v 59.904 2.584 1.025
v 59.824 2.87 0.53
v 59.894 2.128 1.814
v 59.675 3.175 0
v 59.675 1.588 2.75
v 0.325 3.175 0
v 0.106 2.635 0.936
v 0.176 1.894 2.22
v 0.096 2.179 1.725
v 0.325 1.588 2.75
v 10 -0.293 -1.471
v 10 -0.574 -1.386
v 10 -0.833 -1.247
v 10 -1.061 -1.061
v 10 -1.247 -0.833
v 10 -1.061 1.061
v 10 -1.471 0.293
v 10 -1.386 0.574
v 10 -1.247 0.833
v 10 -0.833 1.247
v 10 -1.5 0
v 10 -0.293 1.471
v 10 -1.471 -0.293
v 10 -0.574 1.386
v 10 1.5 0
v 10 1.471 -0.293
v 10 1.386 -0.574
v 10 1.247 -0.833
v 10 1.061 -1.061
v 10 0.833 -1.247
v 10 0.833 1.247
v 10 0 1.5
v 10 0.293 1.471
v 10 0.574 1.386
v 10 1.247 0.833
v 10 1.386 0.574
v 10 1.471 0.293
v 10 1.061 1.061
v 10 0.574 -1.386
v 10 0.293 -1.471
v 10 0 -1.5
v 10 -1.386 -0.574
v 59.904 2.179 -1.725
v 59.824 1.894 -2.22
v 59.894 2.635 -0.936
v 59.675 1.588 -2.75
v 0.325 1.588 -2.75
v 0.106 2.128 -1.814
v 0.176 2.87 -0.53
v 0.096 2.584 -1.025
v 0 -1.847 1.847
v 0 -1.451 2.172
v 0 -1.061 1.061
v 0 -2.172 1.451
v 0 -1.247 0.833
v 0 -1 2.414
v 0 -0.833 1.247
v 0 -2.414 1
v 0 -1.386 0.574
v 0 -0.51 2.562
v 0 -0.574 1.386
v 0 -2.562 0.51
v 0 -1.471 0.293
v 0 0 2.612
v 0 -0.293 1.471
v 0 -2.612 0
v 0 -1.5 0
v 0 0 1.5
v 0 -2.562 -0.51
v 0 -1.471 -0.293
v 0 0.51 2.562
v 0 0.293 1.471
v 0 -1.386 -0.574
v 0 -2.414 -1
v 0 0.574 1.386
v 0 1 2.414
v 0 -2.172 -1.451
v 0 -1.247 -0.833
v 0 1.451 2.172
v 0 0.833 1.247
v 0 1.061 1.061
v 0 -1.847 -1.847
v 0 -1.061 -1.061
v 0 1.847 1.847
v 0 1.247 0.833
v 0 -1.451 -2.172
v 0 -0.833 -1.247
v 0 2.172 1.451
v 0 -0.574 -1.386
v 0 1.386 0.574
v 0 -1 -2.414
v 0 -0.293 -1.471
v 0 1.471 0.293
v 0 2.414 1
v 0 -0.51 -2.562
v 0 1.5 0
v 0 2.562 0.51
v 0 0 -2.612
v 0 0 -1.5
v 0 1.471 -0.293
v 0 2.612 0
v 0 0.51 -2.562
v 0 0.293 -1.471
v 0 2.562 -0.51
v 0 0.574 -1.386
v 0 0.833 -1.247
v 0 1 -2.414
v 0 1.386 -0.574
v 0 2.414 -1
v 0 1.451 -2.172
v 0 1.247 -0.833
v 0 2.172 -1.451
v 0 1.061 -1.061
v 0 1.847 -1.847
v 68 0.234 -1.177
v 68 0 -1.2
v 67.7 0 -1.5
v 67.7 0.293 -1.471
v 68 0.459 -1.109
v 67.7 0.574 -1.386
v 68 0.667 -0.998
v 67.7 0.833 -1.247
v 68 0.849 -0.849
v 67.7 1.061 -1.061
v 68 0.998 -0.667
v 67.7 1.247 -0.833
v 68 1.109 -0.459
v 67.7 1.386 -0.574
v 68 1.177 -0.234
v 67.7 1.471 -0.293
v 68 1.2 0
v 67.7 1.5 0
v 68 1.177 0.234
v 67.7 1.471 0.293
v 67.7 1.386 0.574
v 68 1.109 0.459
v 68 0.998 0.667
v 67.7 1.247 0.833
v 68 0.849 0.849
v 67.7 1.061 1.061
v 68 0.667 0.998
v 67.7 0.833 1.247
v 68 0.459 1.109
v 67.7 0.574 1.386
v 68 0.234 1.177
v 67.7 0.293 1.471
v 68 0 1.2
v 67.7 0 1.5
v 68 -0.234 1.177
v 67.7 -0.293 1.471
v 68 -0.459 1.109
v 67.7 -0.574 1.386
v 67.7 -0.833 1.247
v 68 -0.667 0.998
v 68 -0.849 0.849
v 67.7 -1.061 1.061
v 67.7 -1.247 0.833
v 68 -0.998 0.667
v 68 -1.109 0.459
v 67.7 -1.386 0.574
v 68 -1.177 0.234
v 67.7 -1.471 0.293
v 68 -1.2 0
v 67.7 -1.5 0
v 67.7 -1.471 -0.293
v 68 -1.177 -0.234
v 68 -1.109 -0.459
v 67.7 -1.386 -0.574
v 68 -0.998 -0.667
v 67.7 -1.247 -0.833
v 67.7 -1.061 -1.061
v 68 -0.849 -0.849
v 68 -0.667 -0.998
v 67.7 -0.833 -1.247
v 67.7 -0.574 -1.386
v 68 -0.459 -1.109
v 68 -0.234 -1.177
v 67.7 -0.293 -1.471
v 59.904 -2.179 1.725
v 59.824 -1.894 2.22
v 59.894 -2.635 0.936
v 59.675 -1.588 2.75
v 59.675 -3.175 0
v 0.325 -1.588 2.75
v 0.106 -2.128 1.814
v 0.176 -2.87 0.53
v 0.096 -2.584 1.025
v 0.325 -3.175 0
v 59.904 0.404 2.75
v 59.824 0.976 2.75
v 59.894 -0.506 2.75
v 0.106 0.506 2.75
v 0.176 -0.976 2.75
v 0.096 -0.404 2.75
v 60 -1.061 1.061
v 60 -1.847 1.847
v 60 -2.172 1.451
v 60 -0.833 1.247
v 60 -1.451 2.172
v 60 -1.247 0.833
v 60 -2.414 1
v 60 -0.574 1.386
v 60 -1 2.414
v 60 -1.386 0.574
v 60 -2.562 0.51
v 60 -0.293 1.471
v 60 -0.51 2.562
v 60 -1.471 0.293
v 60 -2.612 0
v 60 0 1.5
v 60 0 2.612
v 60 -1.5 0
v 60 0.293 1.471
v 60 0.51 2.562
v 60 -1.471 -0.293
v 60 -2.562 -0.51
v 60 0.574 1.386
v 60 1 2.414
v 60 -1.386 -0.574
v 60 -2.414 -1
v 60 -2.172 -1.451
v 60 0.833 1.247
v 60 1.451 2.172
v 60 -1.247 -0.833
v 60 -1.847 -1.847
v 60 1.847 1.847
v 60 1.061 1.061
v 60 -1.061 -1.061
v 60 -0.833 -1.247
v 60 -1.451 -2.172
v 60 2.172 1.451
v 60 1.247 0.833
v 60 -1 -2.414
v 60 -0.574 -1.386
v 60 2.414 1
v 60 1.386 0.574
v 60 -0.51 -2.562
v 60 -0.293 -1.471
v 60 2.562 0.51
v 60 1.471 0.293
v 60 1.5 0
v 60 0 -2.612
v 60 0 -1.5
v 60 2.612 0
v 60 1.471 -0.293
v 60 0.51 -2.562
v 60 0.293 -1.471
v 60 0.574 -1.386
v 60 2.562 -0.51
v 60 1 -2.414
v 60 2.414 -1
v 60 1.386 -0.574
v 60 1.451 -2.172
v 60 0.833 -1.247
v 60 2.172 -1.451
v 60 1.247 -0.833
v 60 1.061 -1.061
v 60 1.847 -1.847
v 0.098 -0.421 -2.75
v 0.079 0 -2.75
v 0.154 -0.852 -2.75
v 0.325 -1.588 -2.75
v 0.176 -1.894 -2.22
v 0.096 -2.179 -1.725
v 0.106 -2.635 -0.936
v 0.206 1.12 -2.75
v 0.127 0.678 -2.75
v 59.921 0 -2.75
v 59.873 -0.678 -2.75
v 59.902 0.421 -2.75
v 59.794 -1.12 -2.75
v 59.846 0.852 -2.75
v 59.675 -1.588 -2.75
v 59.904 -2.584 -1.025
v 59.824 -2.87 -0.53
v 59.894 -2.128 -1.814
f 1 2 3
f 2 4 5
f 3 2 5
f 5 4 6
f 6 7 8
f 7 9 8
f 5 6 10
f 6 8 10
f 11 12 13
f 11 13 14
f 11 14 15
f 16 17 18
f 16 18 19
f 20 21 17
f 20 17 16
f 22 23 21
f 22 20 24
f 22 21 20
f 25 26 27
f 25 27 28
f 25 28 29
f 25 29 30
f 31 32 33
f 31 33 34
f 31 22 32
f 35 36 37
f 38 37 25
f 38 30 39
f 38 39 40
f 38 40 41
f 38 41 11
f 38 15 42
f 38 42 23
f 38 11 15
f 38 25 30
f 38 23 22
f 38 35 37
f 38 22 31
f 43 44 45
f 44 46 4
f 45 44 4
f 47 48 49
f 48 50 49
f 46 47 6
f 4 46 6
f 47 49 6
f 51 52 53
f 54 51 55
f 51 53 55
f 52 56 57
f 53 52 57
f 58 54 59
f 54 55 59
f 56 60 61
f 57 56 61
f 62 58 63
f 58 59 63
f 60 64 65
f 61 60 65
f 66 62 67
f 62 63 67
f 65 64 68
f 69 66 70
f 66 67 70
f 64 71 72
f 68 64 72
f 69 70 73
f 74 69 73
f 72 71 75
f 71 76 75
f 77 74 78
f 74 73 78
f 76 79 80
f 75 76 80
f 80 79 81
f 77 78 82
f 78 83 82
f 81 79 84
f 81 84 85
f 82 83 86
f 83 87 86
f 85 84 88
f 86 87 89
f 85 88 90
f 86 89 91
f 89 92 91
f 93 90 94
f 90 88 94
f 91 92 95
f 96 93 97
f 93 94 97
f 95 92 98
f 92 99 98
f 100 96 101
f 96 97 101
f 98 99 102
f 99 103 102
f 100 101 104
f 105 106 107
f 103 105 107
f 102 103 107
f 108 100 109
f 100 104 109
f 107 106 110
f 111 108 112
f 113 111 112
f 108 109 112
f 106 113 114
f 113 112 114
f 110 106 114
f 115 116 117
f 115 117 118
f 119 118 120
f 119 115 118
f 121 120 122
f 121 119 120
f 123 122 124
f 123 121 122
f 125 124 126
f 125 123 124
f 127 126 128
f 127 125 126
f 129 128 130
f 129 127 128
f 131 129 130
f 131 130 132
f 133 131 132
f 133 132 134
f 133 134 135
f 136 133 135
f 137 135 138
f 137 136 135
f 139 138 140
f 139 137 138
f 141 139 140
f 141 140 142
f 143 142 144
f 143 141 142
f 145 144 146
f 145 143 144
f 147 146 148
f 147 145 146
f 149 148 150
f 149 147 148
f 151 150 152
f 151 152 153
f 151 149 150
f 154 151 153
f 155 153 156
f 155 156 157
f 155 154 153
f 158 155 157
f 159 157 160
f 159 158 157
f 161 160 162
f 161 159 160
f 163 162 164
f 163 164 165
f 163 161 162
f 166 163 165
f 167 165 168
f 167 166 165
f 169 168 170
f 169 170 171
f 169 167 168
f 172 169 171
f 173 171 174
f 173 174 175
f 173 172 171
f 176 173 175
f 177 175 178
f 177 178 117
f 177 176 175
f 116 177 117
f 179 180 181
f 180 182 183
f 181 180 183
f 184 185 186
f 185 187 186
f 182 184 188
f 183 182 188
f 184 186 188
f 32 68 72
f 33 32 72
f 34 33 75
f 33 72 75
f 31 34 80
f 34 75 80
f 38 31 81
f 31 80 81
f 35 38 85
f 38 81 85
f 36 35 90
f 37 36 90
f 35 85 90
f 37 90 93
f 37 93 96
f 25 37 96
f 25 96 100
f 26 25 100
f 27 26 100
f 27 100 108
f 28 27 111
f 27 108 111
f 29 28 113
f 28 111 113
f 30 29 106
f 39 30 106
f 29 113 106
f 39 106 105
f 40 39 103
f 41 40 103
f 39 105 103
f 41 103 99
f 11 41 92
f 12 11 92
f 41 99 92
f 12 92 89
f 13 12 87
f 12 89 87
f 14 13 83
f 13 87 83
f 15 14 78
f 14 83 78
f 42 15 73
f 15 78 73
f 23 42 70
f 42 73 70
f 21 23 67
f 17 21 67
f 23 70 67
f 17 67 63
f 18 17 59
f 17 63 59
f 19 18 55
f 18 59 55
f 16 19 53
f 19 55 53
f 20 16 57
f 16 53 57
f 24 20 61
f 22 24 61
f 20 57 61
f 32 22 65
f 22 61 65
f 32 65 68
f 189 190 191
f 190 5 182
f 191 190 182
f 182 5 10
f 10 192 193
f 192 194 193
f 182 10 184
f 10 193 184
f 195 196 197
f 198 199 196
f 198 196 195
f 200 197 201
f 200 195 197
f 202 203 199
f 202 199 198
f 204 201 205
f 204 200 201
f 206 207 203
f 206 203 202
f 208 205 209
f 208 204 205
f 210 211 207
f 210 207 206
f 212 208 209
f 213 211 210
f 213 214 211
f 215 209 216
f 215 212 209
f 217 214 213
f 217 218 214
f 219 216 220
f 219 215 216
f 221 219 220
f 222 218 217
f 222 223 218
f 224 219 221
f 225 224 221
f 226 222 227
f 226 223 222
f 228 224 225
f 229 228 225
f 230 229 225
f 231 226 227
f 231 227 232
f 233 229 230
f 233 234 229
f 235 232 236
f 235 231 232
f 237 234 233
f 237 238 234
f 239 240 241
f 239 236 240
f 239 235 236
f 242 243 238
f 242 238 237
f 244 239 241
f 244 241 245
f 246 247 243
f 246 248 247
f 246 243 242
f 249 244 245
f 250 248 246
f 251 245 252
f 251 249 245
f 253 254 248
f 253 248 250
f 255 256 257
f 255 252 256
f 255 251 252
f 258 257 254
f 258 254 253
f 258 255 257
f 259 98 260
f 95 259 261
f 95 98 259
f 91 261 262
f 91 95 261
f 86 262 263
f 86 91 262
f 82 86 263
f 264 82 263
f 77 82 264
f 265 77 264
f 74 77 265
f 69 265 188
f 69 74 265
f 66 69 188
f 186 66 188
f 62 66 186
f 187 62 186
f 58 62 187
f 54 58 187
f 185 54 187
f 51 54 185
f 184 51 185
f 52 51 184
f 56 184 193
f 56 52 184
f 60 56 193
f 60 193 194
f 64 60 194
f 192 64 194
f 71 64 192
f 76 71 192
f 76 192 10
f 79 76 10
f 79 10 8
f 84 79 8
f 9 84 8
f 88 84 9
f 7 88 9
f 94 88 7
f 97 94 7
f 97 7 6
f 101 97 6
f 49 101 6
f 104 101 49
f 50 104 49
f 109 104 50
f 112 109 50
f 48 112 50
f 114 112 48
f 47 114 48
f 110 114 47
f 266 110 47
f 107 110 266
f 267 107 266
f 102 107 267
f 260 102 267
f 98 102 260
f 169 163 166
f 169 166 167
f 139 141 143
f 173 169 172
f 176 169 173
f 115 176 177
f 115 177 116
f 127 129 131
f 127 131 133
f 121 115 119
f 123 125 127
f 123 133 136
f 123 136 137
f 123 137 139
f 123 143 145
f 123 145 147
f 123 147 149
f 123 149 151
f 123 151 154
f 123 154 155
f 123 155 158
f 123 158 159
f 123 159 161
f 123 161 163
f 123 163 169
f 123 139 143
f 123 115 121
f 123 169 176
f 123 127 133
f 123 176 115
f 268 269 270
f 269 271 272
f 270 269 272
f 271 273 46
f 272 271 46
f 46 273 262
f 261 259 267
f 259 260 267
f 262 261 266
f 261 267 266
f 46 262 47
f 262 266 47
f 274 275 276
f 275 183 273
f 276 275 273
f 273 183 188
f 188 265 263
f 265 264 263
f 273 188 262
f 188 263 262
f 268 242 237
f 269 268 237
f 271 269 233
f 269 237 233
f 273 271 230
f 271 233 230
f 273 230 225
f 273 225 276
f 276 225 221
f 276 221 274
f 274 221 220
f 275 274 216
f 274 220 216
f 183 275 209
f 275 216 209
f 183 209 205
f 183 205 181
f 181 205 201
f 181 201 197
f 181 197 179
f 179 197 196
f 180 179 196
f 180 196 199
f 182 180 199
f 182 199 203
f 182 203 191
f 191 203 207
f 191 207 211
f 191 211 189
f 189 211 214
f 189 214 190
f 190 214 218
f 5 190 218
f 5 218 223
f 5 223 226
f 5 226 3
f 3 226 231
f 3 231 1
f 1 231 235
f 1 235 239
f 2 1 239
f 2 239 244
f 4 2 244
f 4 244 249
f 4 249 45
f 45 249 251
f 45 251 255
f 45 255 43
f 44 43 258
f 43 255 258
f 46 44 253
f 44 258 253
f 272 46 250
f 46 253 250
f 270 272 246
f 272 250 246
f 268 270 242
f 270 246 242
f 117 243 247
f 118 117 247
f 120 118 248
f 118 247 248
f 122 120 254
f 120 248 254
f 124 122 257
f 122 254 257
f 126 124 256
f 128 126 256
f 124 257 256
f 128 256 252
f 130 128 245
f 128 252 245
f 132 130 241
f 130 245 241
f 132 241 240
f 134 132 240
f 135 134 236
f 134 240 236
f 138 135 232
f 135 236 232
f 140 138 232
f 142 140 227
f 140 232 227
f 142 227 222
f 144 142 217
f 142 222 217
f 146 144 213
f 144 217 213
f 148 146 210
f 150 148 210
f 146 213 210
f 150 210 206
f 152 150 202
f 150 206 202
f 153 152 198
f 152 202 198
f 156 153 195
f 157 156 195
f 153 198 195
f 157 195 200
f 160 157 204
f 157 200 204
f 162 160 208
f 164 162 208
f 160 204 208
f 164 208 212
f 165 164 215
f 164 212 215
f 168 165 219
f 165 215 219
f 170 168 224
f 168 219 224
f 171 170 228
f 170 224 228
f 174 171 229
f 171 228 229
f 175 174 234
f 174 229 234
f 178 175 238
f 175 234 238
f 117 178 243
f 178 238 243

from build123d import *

# Parameters (mm, degrees)
BOSS_EXTRUDE1_DEPTH = 60
SKETCH2_R           = 1.5
BOSS_EXTRUDE2_DEPTH = 8
SKETCH3_R           = 1.5
CUT_EXTRUDE1_DEPTH  = 10
CHAMFER1_SIZE       = 0.3


with BuildPart() as part:
    # Sketch1 → Boss-Extrude1 (new body)
    with BuildSketch(Plane(origin=(0, 0, 0), x_dir=(0, 0, -1), z_dir=(1, 0, 0))):
        Polygon((0, 3.175426481), (-2.75, 1.58771324), (-2.75, -1.58771324), (0, -3.175426481), (2.75, -1.58771324), (2.75, 1.58771324), align=None)
    extrude(amount=BOSS_EXTRUDE1_DEPTH)

    # Sketch2 → Boss-Extrude2 (add)
    with BuildSketch(Plane(origin=(60, 0, 0), x_dir=(0, 0, -1), z_dir=(1, 0, 0))):
        Circle(SKETCH2_R)
    extrude(amount=BOSS_EXTRUDE2_DEPTH)

    # Sketch3 → Cut-Extrude1 (cut)
    with BuildSketch(Plane.ZY):
        Circle(SKETCH3_R)
    extrude(amount=-CUT_EXTRUDE1_DEPTH, mode=Mode.SUBTRACT)

    # Sketch4 → Cut-Revolve1 (revolve, cut)
    with BuildSketch(Plane(origin=(0, 0, 0), x_dir=(1, 0, 0), z_dir=(0, 1, 0))):
        Polygon((0, 10.219809024), (4.392081913, 10.219809024), (0, 2.6125), align=None)
        Polygon((60, 2.6125), (60, 10.219809024), (55.607918087, 10.219809024), align=None)
    revolve(axis=Axis((0, 0, 0), (-1, 0, 0)), mode=Mode.SUBTRACT)

    # Chamfer1
    chamfer1_edges = [part.edges().sort_by_distance(p)[0] for p in [
        (68, 0, 1.5),
    ]]
    chamfer(chamfer1_edges, length=CHAMFER1_SIZE)


solid = part.part
